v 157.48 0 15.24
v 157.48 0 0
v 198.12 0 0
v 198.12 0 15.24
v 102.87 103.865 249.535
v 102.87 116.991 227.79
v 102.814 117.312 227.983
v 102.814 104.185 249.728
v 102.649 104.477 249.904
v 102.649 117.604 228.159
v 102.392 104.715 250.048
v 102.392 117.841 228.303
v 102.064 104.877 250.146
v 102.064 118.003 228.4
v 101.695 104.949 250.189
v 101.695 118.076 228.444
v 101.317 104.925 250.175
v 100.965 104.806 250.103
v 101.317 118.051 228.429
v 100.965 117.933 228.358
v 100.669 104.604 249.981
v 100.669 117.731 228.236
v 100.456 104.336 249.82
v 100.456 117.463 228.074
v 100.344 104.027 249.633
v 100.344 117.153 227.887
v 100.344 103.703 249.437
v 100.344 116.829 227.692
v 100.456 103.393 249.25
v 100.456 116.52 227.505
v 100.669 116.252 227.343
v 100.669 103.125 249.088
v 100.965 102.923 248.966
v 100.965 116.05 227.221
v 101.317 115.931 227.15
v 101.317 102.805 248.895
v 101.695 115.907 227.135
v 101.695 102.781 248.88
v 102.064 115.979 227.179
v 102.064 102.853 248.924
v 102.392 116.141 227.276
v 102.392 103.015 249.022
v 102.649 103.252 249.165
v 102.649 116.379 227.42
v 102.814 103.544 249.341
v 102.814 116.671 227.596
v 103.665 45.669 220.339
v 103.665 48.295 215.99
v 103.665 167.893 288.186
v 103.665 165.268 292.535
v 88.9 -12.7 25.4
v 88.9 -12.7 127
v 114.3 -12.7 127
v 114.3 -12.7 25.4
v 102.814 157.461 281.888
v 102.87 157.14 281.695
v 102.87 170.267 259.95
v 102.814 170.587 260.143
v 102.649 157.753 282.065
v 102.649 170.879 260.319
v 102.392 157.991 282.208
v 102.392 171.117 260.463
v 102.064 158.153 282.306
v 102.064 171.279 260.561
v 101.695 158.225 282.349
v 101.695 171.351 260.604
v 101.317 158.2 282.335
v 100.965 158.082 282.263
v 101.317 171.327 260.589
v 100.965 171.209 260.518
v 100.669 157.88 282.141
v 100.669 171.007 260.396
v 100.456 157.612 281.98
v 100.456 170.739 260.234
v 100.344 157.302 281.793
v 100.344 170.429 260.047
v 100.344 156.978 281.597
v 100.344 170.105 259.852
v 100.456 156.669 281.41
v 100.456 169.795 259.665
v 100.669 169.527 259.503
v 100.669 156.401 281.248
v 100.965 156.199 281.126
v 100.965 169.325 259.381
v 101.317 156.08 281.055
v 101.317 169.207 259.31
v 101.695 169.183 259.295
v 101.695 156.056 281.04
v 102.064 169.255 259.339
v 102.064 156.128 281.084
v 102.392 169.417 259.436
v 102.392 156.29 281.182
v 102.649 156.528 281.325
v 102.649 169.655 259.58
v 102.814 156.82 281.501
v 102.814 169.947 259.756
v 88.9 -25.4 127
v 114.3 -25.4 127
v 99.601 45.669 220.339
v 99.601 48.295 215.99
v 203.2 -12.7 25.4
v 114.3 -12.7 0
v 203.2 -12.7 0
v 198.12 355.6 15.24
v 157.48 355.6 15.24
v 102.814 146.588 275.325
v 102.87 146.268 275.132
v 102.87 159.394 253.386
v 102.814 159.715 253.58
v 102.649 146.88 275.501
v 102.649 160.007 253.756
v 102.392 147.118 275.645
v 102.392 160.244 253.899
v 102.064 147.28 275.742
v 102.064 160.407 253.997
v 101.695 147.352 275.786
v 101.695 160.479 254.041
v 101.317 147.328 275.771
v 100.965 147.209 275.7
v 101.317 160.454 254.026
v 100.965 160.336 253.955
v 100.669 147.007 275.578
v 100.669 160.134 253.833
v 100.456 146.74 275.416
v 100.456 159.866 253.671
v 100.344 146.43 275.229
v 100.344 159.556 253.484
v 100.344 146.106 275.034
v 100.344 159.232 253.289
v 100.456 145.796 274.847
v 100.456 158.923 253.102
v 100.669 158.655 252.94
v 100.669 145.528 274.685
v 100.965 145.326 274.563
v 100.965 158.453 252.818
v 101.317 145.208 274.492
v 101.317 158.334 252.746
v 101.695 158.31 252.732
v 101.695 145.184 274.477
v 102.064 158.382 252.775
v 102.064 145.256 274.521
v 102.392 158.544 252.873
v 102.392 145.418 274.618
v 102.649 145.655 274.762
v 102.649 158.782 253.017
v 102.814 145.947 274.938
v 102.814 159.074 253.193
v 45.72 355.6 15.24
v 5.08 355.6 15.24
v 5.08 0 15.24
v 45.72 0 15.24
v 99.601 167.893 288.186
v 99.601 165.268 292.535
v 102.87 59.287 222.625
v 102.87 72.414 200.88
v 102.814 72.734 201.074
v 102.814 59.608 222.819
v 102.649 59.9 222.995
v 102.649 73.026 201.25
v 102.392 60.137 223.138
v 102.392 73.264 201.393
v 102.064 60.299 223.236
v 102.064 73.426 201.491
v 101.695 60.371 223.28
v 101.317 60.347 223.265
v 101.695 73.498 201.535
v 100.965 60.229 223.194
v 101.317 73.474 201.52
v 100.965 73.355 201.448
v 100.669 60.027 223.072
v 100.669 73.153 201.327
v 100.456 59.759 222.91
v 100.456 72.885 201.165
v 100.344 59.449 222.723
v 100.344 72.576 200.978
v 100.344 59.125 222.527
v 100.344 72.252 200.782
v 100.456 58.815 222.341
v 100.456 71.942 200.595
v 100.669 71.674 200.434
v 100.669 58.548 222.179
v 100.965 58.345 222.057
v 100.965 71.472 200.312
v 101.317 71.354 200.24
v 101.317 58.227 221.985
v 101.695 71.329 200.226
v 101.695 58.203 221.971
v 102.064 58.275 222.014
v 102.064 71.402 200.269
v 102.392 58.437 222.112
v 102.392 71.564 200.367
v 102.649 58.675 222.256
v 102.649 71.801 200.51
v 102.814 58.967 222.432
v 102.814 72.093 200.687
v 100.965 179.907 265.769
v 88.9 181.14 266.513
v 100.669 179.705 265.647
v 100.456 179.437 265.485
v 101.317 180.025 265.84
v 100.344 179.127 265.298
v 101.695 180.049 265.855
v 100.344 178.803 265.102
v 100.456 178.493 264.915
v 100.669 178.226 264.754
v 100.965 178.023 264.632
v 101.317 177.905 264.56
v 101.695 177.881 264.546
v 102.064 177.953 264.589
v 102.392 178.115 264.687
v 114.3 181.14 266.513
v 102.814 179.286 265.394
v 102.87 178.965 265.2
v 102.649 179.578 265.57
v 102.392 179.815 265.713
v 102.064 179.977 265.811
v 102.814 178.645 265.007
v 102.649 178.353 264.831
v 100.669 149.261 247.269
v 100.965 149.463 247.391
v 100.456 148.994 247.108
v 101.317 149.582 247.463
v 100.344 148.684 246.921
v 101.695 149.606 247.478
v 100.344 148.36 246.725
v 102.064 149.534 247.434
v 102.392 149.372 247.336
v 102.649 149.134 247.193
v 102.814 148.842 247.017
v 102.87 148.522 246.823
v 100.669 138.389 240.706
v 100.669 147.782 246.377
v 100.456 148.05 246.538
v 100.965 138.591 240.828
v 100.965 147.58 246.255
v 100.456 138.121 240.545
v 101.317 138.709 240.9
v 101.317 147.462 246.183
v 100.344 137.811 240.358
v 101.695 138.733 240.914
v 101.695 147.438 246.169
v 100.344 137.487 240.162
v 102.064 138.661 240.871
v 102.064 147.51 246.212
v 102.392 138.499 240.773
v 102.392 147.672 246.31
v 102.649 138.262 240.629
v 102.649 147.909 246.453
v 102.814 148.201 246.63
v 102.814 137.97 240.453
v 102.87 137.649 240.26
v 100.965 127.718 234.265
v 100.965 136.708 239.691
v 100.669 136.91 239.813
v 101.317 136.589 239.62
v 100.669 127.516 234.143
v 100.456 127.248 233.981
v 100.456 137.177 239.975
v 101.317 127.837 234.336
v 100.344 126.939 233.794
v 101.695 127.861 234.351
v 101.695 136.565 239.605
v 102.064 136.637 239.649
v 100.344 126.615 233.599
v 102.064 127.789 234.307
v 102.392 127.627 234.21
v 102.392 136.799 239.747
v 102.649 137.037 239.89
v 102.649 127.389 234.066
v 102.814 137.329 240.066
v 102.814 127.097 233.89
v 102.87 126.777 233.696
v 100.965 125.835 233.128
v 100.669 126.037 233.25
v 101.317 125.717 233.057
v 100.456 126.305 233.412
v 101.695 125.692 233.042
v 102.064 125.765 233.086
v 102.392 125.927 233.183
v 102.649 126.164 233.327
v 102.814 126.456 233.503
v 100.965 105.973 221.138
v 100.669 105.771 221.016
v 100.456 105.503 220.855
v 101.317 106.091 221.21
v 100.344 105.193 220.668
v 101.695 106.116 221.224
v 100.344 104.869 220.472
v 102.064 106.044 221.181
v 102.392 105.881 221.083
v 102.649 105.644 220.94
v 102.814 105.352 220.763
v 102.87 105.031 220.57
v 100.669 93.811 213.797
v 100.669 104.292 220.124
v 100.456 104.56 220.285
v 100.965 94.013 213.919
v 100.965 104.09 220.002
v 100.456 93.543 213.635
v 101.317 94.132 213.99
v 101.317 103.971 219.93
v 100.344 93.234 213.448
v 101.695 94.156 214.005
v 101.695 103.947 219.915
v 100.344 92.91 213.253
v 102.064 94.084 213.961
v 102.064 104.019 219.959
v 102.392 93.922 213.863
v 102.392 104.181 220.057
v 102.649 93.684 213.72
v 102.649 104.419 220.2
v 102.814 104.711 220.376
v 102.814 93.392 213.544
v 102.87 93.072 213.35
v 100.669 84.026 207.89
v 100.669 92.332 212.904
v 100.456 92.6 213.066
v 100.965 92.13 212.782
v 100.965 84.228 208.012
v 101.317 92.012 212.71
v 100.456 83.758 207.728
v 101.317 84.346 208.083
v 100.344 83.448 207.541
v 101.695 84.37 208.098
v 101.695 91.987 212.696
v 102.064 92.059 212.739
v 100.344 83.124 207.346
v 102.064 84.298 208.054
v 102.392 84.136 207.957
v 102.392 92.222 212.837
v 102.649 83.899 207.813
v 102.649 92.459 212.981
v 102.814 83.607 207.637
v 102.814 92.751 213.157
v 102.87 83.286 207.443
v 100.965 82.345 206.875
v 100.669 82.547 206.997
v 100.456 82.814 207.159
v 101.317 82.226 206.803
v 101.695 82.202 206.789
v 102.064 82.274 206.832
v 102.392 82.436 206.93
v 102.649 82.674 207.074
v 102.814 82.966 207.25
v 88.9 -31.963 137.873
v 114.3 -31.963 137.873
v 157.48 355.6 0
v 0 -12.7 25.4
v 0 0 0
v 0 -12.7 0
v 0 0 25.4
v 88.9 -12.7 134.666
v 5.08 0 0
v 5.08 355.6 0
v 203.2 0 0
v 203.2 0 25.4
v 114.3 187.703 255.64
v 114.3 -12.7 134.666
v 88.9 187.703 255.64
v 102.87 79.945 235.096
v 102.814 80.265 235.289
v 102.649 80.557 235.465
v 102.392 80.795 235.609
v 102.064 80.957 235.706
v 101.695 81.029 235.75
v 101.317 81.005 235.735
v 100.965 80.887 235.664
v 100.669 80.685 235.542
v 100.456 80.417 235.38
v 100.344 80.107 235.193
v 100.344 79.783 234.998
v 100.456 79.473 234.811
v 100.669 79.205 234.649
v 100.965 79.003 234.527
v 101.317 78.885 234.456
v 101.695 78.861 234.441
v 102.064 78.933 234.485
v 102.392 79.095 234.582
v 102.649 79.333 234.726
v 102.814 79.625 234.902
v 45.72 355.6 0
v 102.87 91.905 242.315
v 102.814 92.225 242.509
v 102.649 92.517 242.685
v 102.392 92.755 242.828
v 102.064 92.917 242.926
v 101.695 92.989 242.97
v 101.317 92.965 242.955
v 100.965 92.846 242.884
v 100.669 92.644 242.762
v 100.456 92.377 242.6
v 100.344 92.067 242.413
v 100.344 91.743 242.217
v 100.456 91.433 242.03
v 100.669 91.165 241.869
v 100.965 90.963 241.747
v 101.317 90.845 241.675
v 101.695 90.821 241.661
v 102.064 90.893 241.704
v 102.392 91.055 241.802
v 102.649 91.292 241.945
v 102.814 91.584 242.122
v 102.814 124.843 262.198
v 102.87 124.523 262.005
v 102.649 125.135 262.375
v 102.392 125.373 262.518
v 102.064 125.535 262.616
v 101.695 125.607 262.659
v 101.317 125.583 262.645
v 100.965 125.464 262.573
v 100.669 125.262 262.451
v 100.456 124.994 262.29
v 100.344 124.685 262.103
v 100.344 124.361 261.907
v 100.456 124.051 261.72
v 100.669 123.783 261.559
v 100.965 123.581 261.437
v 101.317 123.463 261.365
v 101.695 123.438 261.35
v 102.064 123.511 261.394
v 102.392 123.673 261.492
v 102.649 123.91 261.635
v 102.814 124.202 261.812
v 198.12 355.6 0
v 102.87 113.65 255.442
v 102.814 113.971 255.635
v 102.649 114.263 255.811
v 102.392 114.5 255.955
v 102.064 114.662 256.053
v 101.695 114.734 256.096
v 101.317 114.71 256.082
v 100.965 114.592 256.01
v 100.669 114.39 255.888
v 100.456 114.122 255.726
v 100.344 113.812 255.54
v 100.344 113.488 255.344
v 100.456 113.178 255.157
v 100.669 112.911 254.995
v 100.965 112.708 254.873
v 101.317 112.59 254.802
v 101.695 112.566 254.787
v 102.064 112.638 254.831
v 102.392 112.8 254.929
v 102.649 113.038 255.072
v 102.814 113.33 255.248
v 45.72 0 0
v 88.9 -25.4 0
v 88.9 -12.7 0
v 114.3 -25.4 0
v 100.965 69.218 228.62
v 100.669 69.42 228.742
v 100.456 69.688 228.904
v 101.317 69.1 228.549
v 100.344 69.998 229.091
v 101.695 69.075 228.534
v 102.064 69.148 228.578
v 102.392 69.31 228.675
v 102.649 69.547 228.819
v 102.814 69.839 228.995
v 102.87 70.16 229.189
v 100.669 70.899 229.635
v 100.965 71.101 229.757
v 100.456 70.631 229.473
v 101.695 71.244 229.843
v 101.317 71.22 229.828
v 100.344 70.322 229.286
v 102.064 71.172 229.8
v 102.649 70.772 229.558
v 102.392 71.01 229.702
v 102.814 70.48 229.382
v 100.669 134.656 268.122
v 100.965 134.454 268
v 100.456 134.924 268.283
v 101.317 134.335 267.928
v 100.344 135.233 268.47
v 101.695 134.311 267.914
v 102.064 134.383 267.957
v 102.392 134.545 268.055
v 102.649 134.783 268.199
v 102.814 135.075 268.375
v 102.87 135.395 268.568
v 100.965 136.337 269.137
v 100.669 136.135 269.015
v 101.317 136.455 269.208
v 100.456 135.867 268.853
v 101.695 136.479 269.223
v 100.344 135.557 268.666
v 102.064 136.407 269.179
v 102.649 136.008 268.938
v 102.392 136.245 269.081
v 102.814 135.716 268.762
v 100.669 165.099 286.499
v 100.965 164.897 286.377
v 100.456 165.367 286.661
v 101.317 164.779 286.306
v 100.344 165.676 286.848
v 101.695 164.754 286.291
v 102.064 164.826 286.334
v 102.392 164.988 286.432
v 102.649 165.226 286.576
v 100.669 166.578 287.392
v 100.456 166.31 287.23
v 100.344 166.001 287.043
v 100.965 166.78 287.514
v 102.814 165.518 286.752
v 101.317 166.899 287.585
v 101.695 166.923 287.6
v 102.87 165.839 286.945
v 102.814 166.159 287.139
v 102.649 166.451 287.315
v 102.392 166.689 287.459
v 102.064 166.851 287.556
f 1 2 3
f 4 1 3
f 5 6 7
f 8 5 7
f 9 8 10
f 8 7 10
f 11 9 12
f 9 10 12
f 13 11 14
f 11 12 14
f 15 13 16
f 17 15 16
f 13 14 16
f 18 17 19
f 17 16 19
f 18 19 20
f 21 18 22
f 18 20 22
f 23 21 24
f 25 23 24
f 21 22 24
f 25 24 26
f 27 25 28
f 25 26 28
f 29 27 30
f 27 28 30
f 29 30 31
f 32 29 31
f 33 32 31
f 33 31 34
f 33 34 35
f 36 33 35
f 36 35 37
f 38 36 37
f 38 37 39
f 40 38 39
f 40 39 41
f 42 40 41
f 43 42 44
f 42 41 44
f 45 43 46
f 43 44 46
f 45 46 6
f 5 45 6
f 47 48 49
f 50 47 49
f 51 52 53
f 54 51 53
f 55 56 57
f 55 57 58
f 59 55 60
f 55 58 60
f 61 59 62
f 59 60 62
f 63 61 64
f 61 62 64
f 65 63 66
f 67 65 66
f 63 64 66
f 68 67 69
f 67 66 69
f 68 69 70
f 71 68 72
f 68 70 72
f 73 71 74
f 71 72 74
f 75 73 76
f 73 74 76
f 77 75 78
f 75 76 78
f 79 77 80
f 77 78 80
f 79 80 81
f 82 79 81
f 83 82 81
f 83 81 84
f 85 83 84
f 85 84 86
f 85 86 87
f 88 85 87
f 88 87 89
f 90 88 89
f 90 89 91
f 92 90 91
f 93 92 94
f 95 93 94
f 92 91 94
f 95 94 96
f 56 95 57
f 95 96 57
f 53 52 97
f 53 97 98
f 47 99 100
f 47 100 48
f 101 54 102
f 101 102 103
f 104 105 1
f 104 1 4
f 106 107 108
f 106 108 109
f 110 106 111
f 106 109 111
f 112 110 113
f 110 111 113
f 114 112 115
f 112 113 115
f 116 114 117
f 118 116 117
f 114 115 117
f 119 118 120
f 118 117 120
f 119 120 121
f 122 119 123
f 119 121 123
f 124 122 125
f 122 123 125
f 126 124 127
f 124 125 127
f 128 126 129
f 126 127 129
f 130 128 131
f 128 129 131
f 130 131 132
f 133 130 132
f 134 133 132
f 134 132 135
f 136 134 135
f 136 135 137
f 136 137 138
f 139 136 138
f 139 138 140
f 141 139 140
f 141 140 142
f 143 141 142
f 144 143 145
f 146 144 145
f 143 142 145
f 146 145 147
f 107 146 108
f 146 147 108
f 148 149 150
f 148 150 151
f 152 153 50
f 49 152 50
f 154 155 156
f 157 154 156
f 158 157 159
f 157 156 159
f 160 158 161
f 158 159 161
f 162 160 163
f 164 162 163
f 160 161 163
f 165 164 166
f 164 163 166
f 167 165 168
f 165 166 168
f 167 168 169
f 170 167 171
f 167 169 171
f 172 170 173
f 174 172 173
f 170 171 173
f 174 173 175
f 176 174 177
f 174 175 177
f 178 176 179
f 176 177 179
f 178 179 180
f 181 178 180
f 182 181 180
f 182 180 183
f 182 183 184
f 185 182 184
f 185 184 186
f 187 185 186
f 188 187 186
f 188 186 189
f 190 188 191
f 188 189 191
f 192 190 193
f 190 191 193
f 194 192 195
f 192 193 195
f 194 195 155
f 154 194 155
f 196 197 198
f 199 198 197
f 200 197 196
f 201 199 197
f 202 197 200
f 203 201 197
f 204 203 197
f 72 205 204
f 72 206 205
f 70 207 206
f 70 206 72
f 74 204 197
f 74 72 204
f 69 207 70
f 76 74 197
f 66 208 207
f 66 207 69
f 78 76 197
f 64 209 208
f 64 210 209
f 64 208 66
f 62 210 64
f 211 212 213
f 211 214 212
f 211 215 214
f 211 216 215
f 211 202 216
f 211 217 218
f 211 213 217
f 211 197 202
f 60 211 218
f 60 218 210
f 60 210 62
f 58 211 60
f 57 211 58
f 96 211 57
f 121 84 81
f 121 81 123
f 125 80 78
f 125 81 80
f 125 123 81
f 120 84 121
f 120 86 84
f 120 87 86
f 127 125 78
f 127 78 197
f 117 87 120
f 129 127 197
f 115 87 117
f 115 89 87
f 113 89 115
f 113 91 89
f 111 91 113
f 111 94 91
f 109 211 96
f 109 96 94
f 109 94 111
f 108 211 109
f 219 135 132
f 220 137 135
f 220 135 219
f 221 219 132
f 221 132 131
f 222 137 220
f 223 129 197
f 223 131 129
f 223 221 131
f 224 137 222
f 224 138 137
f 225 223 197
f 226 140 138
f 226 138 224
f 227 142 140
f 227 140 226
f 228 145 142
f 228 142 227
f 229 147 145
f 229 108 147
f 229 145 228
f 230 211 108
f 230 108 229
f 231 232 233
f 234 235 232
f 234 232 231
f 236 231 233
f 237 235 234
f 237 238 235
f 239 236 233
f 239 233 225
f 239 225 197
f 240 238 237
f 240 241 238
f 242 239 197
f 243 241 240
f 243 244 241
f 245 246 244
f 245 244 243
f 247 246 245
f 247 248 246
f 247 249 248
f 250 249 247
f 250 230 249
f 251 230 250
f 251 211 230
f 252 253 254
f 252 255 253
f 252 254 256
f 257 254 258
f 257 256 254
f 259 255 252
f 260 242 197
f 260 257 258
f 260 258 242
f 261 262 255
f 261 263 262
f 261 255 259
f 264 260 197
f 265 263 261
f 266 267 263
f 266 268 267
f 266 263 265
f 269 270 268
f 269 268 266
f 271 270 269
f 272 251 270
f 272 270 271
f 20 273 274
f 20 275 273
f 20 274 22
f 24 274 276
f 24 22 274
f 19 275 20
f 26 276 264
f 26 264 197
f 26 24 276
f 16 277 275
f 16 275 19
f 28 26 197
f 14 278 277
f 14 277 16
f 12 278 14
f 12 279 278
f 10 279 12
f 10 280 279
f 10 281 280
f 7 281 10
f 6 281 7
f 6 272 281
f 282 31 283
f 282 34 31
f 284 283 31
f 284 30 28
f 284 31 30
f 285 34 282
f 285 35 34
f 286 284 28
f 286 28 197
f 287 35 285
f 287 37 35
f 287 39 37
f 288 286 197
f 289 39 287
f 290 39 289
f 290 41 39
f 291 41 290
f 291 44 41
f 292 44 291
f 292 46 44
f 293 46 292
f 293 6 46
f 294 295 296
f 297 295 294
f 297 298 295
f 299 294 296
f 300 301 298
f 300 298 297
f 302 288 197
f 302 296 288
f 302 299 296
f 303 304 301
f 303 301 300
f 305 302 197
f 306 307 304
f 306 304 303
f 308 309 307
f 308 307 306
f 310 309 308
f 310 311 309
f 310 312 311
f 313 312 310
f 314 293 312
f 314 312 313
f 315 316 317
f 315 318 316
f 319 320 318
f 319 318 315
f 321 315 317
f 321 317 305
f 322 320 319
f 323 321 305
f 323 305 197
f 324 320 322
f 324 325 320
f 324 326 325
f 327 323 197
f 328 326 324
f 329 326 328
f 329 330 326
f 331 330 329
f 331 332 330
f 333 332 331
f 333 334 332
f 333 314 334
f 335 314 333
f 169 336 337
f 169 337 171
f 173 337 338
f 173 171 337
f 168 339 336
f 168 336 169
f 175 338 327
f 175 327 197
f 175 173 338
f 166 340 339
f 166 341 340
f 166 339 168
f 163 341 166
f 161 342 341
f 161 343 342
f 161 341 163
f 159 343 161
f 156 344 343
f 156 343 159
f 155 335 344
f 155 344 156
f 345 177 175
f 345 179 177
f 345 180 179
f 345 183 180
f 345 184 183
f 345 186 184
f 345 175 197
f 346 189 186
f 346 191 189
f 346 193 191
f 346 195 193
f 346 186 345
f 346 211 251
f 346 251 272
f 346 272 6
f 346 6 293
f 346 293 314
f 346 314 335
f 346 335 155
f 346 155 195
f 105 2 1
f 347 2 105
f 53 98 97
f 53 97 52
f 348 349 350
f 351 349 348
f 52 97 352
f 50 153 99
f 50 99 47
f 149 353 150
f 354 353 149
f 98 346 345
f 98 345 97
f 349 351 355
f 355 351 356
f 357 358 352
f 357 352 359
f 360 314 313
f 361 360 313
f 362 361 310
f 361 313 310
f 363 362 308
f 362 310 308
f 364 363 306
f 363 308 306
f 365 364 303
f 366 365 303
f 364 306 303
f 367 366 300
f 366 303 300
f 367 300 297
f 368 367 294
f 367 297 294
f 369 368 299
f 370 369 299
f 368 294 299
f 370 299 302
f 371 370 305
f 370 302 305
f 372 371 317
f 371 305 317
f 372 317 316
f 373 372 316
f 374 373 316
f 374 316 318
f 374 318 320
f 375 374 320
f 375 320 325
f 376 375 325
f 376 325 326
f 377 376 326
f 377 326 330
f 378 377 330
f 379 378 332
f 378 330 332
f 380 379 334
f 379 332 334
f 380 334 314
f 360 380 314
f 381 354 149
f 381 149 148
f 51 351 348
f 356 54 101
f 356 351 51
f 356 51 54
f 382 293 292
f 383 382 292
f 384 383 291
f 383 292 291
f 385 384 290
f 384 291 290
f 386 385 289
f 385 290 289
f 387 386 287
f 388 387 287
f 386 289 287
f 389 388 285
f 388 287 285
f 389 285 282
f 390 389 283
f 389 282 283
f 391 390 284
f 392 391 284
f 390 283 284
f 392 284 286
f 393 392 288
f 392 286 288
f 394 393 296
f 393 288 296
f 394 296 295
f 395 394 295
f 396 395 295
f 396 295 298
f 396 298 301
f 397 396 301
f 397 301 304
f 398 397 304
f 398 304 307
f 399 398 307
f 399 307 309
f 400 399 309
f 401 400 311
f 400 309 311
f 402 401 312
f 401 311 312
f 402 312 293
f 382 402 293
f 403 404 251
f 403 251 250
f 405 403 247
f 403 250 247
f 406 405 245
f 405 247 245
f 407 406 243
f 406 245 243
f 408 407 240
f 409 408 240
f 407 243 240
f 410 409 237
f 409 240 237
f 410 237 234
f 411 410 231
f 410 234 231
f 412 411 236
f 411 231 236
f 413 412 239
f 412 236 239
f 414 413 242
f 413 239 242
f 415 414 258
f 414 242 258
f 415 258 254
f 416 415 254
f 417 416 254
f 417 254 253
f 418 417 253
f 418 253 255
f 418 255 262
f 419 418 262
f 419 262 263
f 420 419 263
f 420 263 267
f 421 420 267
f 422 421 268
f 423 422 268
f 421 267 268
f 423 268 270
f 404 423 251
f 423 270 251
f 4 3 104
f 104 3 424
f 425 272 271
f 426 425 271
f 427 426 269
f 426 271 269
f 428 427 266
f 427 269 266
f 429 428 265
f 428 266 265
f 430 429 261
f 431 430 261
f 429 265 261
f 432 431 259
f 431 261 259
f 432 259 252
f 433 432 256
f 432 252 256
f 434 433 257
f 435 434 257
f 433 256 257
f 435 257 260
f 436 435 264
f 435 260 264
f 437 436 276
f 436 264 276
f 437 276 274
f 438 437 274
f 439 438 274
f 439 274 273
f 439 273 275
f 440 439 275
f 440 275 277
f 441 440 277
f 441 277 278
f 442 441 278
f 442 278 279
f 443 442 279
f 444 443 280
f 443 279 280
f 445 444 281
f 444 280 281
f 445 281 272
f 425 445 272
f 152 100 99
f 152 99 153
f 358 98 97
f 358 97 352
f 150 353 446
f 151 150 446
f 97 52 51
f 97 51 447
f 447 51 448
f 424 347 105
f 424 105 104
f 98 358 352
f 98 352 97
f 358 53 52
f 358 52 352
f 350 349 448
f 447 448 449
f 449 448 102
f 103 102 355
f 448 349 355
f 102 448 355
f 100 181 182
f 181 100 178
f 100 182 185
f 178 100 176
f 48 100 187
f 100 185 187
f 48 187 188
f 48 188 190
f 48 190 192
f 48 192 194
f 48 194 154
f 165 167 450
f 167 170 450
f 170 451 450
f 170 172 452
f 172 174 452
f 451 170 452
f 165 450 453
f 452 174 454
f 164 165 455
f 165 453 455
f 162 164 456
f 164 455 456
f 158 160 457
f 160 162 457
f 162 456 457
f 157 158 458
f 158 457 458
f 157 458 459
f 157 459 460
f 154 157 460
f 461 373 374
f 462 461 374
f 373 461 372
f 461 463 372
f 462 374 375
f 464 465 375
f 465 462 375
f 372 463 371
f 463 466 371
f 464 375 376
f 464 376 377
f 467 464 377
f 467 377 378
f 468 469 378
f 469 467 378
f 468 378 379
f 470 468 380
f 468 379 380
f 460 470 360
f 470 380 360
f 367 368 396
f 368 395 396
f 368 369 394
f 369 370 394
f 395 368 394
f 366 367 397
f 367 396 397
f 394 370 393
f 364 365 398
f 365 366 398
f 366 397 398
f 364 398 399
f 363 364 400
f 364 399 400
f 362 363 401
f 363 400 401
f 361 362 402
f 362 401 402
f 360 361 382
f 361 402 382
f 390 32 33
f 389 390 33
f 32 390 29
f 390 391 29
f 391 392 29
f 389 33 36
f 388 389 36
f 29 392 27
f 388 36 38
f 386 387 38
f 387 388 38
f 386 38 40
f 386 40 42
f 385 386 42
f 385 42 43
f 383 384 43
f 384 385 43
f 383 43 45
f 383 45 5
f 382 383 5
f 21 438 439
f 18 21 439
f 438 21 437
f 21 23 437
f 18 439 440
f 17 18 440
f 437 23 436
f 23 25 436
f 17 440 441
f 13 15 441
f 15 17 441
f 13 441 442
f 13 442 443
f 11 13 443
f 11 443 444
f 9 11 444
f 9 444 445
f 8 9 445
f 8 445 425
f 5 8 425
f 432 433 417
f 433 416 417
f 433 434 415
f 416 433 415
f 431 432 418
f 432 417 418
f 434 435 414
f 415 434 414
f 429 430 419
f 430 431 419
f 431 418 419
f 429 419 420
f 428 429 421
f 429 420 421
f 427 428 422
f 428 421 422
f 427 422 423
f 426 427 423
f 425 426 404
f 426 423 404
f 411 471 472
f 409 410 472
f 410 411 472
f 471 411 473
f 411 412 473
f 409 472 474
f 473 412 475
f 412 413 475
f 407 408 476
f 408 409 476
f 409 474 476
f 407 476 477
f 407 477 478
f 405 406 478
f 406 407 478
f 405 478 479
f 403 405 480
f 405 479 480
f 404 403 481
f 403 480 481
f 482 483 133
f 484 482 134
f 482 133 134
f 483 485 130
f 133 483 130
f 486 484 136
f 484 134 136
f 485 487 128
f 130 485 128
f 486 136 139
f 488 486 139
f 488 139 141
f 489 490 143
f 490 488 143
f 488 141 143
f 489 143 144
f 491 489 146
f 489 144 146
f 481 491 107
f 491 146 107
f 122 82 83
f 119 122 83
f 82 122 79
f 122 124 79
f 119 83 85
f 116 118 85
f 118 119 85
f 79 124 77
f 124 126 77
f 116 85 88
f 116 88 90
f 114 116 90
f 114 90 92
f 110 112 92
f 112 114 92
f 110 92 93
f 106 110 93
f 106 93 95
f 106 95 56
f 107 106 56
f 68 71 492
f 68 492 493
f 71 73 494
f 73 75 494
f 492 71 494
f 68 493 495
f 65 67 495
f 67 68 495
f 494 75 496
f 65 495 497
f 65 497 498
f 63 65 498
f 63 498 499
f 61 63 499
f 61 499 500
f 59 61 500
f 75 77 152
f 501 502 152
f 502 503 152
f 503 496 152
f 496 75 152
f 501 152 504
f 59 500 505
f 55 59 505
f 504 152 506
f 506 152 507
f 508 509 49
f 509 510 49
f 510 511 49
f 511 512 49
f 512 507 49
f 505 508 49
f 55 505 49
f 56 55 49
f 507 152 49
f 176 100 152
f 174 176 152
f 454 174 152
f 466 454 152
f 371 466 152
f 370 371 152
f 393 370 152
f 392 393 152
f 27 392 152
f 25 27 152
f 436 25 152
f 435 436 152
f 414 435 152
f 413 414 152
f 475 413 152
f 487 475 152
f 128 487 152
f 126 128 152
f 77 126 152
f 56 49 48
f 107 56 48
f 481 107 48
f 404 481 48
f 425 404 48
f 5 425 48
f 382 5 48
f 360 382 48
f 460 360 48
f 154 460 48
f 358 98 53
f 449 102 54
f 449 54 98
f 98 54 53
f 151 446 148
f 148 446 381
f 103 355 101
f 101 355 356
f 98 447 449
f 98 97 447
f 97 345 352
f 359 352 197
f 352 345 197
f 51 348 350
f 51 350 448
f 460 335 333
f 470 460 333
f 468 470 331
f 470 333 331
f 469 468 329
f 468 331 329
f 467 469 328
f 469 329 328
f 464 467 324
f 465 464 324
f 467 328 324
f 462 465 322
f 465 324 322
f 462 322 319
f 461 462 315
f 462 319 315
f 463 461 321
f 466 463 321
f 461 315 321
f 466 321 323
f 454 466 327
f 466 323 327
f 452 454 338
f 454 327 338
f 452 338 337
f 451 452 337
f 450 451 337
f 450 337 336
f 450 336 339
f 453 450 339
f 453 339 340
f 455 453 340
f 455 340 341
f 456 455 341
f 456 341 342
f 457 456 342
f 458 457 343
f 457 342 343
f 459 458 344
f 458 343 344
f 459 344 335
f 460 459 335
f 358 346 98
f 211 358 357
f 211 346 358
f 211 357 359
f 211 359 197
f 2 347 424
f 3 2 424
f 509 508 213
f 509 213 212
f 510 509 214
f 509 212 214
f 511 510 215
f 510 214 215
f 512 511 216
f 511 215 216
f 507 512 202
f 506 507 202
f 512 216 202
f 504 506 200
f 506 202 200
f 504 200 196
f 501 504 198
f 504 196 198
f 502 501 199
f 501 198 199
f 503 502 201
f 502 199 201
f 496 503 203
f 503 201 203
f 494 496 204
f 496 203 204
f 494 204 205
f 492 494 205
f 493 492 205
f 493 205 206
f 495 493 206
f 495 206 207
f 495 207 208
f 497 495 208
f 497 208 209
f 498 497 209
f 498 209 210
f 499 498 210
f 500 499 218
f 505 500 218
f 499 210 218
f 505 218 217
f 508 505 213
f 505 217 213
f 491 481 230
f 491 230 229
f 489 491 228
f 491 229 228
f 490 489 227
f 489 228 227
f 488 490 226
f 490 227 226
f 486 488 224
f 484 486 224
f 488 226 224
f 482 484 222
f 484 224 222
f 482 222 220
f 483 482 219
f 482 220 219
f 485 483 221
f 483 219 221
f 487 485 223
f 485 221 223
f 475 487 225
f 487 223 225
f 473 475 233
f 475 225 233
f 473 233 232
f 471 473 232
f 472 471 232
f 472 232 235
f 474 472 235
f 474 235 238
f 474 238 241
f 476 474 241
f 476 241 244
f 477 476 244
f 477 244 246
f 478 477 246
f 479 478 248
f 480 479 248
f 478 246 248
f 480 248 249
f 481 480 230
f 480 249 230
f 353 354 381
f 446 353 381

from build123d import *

# Parameters (mm, degrees)
F0_W      = 40.64
F0_H      = 355.6
F2_DEPTH  = 15.24
F1_W      = 203.2
F1_H      = 25.4
F3_DEPTH  = 12.7
F4_W      = 25.4
F4_H      = 25.4
F4_H_2    = 101.6
F5_DEPTH  = 12.7
F7_DEPTH  = 25.4
F9_DEPTH  = 25.4
F10_R     = 1.27
F11_DEPTH = 25.4
F12_W     = 4.064
F12_H     = 139.7
F13_DEPTH = 5.08


with BuildPart() as f2:
    # F0 (on Top) → F2 (new body)
    with BuildSketch(Plane.XY):
        with Locations((177.8, 177.8)):
            Rectangle(F0_W, F0_H)
    extrude(amount=F2_DEPTH)


with BuildPart() as f2b:
    # F0 (on Top) → F2, piece 2 (new body)
    with BuildSketch(Plane.XY):
        with Locations((25.4, 177.8)):
            Rectangle(F0_W, F0_H)
    extrude(amount=F2_DEPTH)


with BuildPart() as f3:
    # F1 (on Front) → F3 (new body)
    with BuildSketch(Plane.XZ):
        with Locations((101.6, 12.7)):
            Rectangle(F1_W, F1_H)
    extrude(amount=F3_DEPTH)

    # F4 (on face) → F5 (join)
    with BuildSketch(Plane.XZ.offset(12.7)):
        with Locations((101.6, 12.7)):
            Rectangle(F4_W, F4_H)
        with Locations((101.6, 76.2)):
            Rectangle(F4_W, F4_H_2)
    extrude(amount=F5_DEPTH)


with BuildPart() as f7:
    # F6 (on face) → F7 (new body)
    with BuildSketch(Plane.YZ.offset(114.3)):
        Polygon((181.1396062945, 266.5128934246), (-31.9632804674, 137.8725962634), (-25.4, 127), (-12.7, 134.666399075), (187.7028867619, 255.6402971612), align=None)
    extrude(amount=-F7_DEPTH)

    # F10 (on face) → F11 (join)
    with BuildSketch(Plane(origin=(0, -69.5359015573, 115.1917531478), x_dir=(1, 0, 0), z_dir=(0, -0.5167937376, 0.856109942))):
        with Locations((101.6, 290.2676121474)):
            Circle(F10_R)
        with Locations((101.6, 267.4076121474)):
            Circle(F10_R)
        with Locations((101.6, 242.0076121474)):
            Circle(F10_R)
        with Locations((101.6, 217.8776121474)):
            Circle(F10_R)
        with Locations((101.6, 203.9076121474)):
            Circle(F10_R)
        with Locations((101.6, 189.9376121474)):
            Circle(F10_R)
        with Locations((101.6, 178.5076121474)):
            Circle(F10_R)
        with Locations((101.6, 165.8076121474)):
            Circle(F10_R)
        with Locations((101.6, 229.3076121474)):
            Circle(F10_R)
        with Locations((101.6, 254.7076121474)):
            Circle(F10_R)
        with Locations((101.6, 280.1076121474)):
            Circle(F10_R)
    extrude(amount=F11_DEPTH)

    # F12 (on face) → F13 (join)
    with BuildSketch(Plane(origin=(0, -82.6624624921, 136.9369456745), x_dir=(1, 0, 0), z_dir=(0, -0.5167937376, 0.856109942))):
        with Locations((101.6330005474, 222.8175677299)):
            Rectangle(F12_W, F12_H)
    extrude(amount=F13_DEPTH)


with BuildPart() as f9:
    # F8 (on face) → F9 (new body)
    with BuildSketch(Plane.YZ.offset(114.3)):
        Polygon((-25.4, 127), (-12.7, 127), (-12.7, 134.666399075), align=None)
    extrude(amount=-F9_DEPTH)


solid = Compound([f2.part, f2b.part, f3.part, f7.part, f9.part])
